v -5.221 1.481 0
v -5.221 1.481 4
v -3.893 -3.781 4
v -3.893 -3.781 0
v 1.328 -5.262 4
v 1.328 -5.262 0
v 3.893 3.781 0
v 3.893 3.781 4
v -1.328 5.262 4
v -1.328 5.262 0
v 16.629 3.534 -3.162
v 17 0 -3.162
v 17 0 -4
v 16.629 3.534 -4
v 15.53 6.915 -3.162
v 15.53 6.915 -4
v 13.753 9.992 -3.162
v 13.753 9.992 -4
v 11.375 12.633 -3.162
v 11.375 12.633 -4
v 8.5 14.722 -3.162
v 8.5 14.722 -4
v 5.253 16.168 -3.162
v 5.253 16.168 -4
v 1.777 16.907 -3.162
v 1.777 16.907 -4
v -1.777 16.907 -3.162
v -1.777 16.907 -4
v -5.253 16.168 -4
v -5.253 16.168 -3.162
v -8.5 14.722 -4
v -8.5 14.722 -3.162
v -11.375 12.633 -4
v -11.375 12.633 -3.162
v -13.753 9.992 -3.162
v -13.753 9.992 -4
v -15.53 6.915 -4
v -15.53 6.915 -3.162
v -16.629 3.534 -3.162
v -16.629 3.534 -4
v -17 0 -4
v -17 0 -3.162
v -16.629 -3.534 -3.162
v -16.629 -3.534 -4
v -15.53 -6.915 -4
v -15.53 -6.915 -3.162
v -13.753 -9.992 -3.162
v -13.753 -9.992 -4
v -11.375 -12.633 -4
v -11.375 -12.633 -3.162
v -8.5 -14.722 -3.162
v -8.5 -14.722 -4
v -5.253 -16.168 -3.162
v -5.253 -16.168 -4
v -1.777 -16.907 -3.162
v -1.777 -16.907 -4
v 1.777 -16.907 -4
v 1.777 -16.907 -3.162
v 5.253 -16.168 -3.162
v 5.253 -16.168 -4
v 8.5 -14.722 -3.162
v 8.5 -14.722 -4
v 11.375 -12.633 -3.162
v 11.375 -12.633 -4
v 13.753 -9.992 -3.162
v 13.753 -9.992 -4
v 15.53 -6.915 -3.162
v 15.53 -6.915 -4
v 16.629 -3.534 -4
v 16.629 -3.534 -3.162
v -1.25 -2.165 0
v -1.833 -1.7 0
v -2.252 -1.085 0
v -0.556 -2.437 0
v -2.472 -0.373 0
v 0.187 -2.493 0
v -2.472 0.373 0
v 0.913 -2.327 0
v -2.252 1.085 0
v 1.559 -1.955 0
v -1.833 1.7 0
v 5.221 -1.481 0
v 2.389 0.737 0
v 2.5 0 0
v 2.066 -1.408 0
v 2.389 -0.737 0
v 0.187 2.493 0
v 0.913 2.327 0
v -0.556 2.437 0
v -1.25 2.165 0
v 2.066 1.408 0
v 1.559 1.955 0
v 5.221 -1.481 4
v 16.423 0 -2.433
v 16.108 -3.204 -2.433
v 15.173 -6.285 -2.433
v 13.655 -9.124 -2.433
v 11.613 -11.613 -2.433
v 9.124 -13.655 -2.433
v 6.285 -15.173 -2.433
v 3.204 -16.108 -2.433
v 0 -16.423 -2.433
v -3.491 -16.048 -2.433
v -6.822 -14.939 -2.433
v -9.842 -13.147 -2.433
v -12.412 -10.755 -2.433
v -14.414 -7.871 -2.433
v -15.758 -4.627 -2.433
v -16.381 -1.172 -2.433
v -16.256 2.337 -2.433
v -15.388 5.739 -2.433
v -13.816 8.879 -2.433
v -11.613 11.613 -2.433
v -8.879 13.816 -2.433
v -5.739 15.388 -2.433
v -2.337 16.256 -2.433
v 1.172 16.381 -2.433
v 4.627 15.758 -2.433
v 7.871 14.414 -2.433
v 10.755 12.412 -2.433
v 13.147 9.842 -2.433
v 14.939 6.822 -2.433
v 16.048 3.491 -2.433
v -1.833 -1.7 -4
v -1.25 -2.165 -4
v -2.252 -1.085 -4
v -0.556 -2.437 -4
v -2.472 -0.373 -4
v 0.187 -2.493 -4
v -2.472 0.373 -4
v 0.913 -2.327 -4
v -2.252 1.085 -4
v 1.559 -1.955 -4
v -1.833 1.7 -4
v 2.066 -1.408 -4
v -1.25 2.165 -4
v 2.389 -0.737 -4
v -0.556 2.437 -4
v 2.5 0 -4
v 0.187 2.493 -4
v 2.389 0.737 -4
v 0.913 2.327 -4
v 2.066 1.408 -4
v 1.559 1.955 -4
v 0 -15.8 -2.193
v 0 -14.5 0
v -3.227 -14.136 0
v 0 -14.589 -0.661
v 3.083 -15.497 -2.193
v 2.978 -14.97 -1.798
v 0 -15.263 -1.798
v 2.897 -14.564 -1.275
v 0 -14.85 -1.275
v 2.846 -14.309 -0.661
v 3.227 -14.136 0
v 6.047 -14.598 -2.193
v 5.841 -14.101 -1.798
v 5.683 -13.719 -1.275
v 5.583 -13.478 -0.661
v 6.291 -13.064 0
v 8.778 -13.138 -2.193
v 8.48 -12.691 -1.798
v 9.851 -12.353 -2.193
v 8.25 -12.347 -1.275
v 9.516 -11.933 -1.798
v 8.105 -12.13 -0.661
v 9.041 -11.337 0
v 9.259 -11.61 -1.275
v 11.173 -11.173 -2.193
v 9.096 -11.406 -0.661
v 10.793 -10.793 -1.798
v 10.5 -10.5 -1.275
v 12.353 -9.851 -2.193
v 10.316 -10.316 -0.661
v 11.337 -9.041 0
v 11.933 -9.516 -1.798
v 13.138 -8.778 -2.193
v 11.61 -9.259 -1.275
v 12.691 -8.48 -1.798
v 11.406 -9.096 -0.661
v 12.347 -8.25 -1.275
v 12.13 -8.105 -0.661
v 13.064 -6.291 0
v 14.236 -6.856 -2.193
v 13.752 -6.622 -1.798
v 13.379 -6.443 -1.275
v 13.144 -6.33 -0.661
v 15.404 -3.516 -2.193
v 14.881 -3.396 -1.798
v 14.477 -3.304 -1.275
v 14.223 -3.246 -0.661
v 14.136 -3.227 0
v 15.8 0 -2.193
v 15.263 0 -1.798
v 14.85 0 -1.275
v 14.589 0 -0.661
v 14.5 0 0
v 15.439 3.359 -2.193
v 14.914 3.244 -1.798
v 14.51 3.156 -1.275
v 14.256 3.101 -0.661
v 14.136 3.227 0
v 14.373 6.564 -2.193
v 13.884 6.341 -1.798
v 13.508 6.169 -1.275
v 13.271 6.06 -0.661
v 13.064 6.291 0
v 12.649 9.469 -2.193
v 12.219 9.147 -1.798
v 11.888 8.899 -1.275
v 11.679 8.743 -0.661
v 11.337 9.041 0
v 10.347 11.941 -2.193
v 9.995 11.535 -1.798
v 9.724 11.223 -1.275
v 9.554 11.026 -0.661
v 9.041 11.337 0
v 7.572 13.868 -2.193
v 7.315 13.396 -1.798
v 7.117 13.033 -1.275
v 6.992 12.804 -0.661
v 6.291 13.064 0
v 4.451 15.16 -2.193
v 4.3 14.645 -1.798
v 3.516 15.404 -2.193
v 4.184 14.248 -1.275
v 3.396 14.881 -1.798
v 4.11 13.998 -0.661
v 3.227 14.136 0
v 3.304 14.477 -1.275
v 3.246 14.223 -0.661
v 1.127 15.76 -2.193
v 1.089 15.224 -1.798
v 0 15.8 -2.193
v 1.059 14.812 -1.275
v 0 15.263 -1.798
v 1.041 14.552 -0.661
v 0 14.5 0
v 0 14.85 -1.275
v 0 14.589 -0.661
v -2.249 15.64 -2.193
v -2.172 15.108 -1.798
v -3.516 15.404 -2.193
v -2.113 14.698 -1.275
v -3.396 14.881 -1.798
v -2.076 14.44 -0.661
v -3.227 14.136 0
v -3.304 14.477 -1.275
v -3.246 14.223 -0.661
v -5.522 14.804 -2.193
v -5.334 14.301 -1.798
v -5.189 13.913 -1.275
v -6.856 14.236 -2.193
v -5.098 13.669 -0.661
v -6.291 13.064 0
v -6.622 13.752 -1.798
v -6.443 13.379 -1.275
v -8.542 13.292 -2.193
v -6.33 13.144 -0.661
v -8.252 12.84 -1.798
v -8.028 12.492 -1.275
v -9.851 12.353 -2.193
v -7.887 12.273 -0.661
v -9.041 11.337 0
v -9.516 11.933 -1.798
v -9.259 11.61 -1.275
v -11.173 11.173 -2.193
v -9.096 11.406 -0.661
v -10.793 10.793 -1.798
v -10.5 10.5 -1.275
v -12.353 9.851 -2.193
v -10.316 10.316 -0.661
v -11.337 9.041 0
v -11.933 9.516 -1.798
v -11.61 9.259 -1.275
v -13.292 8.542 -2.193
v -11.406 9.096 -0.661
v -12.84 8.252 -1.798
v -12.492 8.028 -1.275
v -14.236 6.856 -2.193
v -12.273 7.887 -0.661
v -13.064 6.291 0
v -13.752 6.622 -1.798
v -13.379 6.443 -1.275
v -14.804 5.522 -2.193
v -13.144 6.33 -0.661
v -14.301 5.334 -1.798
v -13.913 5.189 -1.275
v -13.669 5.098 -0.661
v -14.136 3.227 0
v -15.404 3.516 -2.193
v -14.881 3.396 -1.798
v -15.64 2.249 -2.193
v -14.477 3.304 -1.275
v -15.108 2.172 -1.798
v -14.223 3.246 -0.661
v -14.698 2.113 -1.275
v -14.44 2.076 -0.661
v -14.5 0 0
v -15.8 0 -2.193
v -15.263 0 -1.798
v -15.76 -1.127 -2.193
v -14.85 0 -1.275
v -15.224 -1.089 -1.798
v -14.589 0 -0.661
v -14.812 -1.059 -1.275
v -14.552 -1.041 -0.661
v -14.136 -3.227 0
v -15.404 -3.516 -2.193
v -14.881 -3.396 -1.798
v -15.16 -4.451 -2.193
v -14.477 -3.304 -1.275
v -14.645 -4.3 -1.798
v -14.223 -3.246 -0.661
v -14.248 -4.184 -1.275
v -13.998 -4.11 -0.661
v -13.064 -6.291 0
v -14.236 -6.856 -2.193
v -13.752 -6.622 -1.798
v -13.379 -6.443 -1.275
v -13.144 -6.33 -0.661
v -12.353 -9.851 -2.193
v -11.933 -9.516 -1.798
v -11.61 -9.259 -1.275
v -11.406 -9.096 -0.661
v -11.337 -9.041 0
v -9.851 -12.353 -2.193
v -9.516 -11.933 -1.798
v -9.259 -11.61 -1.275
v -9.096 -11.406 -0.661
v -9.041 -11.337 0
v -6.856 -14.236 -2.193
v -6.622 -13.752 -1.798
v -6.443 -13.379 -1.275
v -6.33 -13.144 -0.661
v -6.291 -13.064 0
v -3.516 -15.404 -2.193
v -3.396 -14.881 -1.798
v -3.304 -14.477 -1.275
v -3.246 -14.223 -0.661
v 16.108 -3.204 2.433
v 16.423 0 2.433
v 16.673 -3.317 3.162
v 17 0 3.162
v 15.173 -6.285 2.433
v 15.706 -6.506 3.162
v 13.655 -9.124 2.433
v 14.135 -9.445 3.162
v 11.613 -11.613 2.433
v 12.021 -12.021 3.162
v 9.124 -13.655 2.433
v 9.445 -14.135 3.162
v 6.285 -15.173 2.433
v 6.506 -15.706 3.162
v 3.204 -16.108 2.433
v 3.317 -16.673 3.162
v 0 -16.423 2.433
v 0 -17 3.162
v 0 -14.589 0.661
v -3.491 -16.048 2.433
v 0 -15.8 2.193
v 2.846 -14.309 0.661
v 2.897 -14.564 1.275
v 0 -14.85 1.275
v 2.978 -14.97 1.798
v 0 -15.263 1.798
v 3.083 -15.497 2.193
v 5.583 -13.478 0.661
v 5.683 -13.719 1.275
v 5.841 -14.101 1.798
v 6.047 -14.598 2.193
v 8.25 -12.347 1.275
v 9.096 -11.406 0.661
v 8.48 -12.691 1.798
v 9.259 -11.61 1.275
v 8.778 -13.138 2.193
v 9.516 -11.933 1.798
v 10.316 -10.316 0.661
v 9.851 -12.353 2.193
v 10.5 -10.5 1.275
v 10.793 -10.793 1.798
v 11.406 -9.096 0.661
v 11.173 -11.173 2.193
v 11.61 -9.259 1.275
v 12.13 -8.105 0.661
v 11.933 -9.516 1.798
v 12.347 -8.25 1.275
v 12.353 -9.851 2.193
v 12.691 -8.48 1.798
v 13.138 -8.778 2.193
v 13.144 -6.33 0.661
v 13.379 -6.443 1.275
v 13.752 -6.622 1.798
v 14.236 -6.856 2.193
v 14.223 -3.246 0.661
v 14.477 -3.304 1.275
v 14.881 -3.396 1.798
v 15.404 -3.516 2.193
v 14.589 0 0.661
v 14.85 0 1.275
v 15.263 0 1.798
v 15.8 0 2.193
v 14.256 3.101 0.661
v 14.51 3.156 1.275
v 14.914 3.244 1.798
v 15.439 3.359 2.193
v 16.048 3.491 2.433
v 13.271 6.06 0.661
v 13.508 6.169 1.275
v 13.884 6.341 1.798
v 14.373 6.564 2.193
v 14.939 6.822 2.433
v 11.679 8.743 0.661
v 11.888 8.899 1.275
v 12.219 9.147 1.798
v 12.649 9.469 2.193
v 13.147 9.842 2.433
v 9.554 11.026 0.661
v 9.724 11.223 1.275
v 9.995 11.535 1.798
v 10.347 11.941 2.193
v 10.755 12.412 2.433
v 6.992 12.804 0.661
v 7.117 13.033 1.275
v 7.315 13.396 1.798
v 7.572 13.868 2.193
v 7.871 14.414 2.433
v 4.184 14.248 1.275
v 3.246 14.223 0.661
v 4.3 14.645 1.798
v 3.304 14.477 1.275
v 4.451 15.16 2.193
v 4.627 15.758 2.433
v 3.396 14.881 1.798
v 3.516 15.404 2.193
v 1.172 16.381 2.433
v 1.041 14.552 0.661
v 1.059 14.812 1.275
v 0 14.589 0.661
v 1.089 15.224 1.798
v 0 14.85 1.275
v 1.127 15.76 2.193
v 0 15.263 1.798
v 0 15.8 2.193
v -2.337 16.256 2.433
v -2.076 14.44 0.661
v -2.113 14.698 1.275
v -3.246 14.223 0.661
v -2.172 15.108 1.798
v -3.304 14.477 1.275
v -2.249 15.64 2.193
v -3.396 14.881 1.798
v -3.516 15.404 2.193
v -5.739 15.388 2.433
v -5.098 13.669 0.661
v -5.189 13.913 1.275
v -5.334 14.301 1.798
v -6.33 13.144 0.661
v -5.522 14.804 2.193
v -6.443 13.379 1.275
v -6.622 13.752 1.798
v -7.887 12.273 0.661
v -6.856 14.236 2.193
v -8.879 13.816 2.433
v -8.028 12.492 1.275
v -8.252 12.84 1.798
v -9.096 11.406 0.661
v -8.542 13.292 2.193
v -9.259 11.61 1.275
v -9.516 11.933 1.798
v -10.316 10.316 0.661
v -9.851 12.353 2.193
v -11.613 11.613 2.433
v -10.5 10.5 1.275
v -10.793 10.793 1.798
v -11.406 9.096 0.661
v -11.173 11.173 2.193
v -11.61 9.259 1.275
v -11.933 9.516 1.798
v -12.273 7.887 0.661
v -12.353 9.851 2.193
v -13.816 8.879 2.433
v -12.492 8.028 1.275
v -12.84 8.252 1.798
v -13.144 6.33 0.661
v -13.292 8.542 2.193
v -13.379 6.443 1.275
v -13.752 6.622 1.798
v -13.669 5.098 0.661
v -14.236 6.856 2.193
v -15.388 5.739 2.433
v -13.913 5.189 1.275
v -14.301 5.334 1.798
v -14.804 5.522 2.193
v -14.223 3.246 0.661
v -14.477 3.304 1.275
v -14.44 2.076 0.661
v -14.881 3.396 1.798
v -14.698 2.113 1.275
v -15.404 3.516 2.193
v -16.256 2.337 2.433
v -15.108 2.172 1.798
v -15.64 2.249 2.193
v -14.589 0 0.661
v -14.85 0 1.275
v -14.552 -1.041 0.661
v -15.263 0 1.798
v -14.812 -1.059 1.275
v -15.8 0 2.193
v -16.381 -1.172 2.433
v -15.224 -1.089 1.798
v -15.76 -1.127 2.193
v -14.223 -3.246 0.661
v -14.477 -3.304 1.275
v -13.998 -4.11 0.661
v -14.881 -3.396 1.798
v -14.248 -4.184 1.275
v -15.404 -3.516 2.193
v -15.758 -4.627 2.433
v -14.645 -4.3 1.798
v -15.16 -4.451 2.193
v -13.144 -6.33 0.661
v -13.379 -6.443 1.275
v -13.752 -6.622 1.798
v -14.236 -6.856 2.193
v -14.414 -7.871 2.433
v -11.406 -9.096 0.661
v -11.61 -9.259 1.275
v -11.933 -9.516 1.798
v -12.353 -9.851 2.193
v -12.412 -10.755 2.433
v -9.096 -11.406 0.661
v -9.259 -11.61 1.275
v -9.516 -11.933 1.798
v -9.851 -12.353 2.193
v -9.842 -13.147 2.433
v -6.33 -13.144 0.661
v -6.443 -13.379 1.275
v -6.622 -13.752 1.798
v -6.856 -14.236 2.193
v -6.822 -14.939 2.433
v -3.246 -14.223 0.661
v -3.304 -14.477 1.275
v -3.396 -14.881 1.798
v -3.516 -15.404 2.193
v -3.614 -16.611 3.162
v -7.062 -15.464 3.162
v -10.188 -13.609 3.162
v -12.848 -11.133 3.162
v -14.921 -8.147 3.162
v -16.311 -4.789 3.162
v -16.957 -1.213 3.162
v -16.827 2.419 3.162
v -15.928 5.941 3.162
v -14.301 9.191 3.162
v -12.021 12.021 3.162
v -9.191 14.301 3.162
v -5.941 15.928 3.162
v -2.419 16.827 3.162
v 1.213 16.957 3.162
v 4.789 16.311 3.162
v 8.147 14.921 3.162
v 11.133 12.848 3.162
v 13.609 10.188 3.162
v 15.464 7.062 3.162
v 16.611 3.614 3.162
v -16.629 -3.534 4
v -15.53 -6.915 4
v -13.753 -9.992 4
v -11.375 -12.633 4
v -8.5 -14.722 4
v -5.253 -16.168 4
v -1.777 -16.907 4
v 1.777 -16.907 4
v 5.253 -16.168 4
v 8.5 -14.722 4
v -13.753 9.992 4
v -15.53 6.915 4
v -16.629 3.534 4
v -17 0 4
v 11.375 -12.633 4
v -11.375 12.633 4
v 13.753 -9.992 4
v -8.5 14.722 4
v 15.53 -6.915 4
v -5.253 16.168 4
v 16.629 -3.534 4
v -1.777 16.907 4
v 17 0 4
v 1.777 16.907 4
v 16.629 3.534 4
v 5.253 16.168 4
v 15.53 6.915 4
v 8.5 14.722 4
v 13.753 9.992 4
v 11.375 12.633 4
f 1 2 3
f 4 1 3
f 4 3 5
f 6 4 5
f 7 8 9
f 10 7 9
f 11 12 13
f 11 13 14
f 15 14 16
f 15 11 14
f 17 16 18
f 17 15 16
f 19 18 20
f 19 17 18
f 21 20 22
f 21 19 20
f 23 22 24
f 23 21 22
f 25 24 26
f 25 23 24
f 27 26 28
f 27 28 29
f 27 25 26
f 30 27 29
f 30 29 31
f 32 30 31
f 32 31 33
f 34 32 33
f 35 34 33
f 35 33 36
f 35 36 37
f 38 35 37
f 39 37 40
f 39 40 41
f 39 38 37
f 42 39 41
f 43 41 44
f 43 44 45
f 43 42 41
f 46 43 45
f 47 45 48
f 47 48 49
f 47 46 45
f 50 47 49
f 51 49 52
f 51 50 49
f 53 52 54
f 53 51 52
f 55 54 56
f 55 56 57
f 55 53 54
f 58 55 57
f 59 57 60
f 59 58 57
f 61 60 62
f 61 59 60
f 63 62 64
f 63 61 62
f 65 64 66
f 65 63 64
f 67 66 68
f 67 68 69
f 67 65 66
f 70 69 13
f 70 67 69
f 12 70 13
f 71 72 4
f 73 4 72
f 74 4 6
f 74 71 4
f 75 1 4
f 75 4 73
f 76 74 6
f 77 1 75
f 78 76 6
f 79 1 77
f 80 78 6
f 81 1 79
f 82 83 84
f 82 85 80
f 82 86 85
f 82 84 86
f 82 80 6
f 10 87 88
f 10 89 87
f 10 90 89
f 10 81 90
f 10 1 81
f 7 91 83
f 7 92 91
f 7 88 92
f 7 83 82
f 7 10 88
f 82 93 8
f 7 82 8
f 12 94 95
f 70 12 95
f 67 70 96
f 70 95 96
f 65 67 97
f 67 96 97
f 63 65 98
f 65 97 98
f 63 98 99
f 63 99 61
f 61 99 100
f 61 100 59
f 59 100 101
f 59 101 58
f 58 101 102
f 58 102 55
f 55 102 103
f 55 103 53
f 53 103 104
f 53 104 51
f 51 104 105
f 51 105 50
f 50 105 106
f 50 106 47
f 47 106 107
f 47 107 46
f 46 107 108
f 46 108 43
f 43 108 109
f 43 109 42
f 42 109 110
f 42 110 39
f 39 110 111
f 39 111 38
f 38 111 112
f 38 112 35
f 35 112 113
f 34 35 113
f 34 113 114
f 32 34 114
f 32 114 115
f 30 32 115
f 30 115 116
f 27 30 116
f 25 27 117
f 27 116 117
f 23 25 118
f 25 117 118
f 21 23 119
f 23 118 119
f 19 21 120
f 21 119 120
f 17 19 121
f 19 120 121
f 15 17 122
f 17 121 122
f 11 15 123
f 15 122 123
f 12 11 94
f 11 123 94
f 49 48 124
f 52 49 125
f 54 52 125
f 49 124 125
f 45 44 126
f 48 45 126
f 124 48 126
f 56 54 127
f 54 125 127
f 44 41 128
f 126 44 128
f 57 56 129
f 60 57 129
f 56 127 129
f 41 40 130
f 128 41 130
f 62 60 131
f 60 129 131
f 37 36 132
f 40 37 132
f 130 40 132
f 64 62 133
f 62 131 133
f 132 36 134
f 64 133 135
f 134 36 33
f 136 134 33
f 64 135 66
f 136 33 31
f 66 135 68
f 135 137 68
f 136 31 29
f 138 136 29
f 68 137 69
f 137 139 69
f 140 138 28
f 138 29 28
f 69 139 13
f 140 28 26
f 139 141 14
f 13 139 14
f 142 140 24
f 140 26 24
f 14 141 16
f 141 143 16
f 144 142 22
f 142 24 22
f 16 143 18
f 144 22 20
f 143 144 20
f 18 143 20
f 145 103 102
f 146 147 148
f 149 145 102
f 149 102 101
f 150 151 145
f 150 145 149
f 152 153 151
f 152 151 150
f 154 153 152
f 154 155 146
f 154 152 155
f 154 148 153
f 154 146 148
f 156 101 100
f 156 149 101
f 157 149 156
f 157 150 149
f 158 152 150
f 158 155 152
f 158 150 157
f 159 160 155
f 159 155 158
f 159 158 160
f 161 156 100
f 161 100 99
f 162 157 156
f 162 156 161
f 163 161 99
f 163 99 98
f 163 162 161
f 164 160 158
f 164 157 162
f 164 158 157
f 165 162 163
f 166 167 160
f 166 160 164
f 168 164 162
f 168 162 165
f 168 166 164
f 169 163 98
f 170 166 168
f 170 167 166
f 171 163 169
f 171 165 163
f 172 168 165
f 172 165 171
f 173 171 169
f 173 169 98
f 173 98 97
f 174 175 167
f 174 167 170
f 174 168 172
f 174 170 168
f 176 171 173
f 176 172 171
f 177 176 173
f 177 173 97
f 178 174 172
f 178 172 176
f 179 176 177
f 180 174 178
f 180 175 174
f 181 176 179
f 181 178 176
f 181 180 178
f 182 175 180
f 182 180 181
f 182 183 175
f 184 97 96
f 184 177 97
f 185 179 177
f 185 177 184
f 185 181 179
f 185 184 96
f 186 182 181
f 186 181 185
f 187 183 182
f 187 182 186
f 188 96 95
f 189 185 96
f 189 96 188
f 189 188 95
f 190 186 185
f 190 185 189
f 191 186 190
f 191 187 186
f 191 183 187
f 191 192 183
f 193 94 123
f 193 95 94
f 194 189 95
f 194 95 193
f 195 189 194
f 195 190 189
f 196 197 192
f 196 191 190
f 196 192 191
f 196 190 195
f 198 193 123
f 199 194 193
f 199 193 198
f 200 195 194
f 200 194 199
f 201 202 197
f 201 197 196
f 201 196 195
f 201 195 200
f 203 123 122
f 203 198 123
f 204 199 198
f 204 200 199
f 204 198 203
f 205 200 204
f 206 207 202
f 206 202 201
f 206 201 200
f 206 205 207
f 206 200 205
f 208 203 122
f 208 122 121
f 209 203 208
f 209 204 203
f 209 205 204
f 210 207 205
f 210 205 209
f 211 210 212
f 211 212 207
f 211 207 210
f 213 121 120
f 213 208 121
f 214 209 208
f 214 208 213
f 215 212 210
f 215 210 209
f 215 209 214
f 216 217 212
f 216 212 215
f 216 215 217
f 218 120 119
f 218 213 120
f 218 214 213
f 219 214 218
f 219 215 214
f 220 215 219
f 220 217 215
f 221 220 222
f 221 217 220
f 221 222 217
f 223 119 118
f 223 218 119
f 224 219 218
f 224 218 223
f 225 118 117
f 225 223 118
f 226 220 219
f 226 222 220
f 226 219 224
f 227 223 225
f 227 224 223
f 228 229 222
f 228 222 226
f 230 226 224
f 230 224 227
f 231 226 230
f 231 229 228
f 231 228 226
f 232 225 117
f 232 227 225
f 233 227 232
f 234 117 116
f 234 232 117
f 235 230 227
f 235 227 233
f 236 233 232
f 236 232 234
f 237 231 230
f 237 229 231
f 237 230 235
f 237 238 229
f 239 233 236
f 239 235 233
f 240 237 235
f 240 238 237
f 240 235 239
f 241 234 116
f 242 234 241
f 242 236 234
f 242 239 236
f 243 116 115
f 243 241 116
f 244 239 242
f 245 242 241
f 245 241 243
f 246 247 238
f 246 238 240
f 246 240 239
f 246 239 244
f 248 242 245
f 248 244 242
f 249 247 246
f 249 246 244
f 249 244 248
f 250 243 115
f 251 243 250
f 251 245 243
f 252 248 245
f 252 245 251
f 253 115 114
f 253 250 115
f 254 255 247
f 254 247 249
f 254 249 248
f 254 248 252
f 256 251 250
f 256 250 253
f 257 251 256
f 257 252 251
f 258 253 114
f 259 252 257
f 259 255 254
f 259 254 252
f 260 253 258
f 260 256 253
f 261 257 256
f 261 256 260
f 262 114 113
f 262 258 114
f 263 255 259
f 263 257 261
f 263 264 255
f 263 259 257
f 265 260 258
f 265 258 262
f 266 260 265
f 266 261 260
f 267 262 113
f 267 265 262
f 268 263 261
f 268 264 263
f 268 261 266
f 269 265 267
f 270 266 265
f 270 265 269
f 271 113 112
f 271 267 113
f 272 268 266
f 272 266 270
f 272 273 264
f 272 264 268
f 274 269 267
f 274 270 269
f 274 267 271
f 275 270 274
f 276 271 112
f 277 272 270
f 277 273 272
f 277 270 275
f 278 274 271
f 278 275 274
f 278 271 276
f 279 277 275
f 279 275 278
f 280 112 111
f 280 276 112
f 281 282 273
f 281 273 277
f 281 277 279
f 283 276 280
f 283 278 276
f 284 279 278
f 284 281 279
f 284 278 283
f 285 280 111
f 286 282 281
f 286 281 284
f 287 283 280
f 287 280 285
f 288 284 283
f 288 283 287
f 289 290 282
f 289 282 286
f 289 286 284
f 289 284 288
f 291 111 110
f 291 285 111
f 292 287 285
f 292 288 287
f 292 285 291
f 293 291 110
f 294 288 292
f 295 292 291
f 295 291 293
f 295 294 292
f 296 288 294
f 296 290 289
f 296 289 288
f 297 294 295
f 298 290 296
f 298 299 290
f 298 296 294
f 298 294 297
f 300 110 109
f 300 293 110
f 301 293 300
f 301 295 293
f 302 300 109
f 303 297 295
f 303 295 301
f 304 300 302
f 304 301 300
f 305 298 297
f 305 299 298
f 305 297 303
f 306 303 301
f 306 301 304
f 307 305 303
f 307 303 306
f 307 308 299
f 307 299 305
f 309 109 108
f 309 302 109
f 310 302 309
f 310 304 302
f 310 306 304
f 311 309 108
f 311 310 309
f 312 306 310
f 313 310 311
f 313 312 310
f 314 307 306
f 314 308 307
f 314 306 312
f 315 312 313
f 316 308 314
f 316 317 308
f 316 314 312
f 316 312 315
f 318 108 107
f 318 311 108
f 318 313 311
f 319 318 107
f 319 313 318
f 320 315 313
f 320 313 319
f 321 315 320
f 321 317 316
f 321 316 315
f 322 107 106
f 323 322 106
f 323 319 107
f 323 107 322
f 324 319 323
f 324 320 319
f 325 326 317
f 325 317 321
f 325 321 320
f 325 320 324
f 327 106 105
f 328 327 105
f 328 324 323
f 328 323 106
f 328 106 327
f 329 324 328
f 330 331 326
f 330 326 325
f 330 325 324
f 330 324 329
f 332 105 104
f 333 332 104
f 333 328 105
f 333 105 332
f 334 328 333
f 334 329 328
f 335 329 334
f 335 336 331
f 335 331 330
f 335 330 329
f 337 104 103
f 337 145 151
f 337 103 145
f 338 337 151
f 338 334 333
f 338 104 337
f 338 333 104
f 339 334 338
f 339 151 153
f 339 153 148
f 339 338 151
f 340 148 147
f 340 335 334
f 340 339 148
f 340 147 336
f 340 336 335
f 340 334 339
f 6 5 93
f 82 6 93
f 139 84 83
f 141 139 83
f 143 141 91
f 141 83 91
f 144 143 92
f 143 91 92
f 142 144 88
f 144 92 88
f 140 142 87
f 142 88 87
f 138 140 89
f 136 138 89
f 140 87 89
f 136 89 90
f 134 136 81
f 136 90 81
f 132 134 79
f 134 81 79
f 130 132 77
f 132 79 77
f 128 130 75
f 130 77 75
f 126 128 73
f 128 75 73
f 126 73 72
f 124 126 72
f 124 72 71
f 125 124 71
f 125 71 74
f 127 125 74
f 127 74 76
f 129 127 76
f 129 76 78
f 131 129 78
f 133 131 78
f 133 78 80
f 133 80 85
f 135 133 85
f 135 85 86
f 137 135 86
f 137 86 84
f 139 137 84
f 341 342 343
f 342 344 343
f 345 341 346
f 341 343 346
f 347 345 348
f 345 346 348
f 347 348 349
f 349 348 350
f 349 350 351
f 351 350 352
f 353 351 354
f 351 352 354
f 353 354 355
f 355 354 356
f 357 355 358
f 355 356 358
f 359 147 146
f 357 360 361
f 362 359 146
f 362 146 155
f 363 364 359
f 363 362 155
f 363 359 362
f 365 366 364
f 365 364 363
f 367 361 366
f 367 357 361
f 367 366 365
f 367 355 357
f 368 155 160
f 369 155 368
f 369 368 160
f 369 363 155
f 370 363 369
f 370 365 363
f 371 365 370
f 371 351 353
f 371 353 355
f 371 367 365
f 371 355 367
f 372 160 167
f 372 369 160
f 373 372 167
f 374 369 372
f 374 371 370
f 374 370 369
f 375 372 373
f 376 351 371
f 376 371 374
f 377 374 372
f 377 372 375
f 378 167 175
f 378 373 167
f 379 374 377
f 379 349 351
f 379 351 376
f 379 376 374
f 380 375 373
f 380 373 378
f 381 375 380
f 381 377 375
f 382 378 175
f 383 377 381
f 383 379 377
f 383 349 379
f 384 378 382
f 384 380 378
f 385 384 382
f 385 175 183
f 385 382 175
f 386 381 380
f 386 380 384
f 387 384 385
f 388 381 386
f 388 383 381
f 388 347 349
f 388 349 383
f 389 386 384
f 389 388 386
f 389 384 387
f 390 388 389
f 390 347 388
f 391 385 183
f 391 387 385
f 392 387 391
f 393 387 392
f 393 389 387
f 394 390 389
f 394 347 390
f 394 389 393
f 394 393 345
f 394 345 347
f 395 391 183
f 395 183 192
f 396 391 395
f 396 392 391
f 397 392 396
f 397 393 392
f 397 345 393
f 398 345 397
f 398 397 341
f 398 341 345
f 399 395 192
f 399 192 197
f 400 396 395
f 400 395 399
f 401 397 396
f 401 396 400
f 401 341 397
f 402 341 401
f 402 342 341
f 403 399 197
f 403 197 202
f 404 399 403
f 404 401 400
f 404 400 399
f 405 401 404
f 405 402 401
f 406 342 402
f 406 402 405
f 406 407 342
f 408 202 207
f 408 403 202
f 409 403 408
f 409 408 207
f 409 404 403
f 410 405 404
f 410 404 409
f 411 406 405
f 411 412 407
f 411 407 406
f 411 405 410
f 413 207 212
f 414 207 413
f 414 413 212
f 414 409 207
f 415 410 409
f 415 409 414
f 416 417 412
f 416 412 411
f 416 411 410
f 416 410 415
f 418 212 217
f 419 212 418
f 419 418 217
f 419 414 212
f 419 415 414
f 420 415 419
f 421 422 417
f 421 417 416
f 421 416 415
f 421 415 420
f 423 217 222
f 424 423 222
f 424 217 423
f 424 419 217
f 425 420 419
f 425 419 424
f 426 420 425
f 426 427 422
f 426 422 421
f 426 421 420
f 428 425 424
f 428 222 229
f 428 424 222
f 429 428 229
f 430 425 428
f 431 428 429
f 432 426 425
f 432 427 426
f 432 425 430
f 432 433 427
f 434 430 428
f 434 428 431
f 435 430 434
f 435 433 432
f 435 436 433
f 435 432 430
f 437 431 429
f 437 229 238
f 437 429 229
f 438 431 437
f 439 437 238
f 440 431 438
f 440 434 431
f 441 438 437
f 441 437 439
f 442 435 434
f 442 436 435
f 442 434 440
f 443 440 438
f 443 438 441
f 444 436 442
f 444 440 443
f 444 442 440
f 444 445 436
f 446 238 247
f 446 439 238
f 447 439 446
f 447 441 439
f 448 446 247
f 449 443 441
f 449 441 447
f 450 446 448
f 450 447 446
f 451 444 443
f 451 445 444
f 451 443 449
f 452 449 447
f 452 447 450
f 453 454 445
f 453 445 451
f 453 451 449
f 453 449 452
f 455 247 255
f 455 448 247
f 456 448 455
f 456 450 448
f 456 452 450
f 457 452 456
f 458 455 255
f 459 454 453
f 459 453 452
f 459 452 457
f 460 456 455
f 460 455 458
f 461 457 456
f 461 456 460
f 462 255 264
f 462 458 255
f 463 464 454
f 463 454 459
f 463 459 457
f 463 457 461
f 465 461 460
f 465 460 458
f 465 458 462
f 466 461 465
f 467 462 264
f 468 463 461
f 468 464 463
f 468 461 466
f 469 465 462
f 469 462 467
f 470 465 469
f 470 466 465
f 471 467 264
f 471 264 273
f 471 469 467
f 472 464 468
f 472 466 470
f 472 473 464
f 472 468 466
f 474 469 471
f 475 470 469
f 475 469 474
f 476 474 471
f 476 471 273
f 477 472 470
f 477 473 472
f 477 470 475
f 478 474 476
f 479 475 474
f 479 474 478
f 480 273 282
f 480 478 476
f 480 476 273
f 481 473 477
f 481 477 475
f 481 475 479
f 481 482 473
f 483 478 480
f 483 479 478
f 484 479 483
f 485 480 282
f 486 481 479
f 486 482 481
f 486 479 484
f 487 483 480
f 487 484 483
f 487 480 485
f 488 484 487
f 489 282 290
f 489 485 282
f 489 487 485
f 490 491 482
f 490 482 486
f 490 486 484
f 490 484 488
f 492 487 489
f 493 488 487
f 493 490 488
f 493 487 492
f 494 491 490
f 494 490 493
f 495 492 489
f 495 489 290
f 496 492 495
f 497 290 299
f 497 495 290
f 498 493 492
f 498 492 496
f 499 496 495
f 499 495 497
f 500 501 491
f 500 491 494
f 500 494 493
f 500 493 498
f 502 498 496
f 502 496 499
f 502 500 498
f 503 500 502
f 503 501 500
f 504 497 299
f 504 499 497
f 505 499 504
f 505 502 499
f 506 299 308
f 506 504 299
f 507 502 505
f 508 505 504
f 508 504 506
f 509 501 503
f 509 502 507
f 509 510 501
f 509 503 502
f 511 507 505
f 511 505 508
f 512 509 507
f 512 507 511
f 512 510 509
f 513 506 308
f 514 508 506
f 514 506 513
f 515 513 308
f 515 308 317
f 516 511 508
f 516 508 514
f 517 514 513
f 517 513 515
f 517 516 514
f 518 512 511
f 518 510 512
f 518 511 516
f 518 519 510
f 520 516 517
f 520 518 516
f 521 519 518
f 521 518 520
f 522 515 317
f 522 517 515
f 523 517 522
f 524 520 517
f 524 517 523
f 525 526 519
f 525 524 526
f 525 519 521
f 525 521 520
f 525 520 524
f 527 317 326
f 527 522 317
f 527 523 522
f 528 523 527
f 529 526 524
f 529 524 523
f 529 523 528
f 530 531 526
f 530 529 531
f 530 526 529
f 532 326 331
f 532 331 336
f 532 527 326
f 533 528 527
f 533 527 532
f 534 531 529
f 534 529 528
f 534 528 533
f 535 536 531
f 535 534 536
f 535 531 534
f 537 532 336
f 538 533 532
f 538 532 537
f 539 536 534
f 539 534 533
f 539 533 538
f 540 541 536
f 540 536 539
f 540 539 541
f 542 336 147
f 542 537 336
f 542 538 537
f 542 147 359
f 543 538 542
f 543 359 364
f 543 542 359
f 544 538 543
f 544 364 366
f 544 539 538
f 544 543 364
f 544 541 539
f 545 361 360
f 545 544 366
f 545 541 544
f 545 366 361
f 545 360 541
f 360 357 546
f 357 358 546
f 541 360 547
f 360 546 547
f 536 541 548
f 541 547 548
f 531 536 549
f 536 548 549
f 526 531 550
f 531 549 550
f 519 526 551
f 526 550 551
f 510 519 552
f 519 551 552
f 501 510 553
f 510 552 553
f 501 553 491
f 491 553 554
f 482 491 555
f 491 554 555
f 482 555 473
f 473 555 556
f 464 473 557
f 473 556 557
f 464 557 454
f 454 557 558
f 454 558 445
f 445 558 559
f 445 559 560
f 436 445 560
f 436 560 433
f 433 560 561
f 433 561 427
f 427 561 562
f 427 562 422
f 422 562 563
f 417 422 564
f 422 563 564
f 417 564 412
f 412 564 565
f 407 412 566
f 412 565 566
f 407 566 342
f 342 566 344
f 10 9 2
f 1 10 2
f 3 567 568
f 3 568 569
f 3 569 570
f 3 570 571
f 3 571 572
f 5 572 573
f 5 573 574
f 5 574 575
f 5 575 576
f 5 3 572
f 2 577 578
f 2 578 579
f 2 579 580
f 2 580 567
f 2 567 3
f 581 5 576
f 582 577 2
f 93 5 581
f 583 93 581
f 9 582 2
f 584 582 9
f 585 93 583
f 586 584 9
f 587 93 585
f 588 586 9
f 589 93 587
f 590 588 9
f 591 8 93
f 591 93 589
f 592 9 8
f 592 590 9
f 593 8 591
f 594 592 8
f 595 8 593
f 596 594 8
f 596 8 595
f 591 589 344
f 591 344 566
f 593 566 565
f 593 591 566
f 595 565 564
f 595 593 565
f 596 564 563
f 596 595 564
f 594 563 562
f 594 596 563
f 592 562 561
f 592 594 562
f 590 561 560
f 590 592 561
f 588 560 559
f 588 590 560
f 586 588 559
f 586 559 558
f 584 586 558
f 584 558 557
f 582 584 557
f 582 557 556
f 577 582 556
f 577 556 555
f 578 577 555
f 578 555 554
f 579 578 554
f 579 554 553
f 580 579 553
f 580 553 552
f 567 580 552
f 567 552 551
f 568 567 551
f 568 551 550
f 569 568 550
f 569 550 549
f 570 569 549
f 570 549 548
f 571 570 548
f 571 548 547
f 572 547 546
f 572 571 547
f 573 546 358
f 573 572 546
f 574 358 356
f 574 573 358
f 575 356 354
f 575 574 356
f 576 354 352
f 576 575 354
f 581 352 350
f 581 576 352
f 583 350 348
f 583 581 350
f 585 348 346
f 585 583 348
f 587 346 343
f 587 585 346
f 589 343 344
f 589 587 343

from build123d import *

# Parameters (mm, degrees)
F0_R        = 17
F1_DEPTH    = 4
F2_R        = 2.5
F3_DEPTH    = 25
F5_DEPTH    = 4
F6_R        = 2.5
F8_T2_ANGLE = 270
F8_T4_ANGLE = 90
F8_T6_ANGLE = 90
F8_T8_ANGLE = 270


# Not quite as in the source:
# - a fillet or chamfer that OpenCascade refuses, or shapes differently, is made with other operations: its cross-section is extruded or revolved along the edge and cut away or added


with BuildPart() as f1:
    # F0 (on Top) → F1 (new body, symmetric)
    with BuildSketch(Plane.XY):
        Circle(F0_R)
    extrude(amount=F1_DEPTH, both=True)

    # F2 (on face) → F3 (cut)
    with BuildSketch(Plane.XY.offset(4)):
        Circle(F2_R)
    extrude(amount=-F3_DEPTH, mode=Mode.SUBTRACT)

    # F4 (on face) → F5 (cut)
    with BuildSketch(Plane.XY.offset(4)):
        Polygon((5.2209928438, -1.4814071211), (3.8934326221, 3.7808088751), (-1.3275602216, 5.2622159963), (-5.2209928438, 1.4814071211), (-3.8934326221, -3.7808088751), (1.3275602216, -5.2622159963), align=None)
    extrude(amount=-F5_DEPTH, mode=Mode.SUBTRACT)

    # F6 (on Right) → F7 (revolve, cut)
    with BuildSketch(Plane.YZ):
        with Locations((-17, 0)):
            Circle(F6_R)
    revolve(axis=Axis((0, 0, 0), (0, 0, 1)), mode=Mode.SUBTRACT)

    # F8: chamfer of 0.75 on 4 edges, made by hand

    # F8_s1 → F8_t2 (revolve, cut)
    with BuildSketch(Plane.YZ):
        with BuildLine():
            Line((-17, -3.1622776602), (-16.4230769231, -2.4325212771))
            ThreePointArc((-16.4230769231, -2.4325212771), (-16.6989227011, -2.4818042751), (-17, -2.5))
            Line((-17, -2.5), (-17, -3.1622776602))
        make_face()
    revolve(axis=Axis((0, 0, -2.5), (0, 0, -1)), revolution_arc=F8_T2_ANGLE, mode=Mode.SUBTRACT)

    # F8_s3 → F8_t4 (revolve, cut)
    with BuildSketch(Plane.XZ):
        with BuildLine():
            Line((17, -3.1622776602), (16.4230769231, -2.4325212771))
            ThreePointArc((16.4230769231, -2.4325212771), (16.6989227011, -2.4818042751), (17, -2.5))
            Line((17, -2.5), (17, -3.1622776602))
        make_face()
    revolve(axis=Axis((0, 0, -2.5), (0, 0, -1)), revolution_arc=F8_T4_ANGLE, mode=Mode.SUBTRACT)

    # F8_s5 → F8_t6 (revolve, cut)
    with BuildSketch(Plane.XZ):
        with BuildLine():
            Line((16.4230769231, 2.4325212771), (17, 3.1622776602))
            Line((17, 3.1622776602), (17, 2.5))
            ThreePointArc((17, 2.5), (16.6989227011, 2.4818042751), (16.4230769231, 2.4325212771))
        make_face()
    revolve(axis=Axis((0, 0, 2.5), (0, 0, -1)), revolution_arc=F8_T6_ANGLE, mode=Mode.SUBTRACT)

    # F8_s7 → F8_t8 (revolve, cut)
    with BuildSketch(Plane.YZ):
        with BuildLine():
            Line((-16.4230769231, 2.4325212771), (-17, 3.1622776602))
            Line((-17, 3.1622776602), (-17, 2.5))
            ThreePointArc((-17, 2.5), (-16.6989227011, 2.4818042751), (-16.4230769231, 2.4325212771))
        make_face()
    revolve(axis=Axis((0, 0, 2.5), (0, 0, -1)), revolution_arc=F8_T8_ANGLE, mode=Mode.SUBTRACT)


solid = f1.part
